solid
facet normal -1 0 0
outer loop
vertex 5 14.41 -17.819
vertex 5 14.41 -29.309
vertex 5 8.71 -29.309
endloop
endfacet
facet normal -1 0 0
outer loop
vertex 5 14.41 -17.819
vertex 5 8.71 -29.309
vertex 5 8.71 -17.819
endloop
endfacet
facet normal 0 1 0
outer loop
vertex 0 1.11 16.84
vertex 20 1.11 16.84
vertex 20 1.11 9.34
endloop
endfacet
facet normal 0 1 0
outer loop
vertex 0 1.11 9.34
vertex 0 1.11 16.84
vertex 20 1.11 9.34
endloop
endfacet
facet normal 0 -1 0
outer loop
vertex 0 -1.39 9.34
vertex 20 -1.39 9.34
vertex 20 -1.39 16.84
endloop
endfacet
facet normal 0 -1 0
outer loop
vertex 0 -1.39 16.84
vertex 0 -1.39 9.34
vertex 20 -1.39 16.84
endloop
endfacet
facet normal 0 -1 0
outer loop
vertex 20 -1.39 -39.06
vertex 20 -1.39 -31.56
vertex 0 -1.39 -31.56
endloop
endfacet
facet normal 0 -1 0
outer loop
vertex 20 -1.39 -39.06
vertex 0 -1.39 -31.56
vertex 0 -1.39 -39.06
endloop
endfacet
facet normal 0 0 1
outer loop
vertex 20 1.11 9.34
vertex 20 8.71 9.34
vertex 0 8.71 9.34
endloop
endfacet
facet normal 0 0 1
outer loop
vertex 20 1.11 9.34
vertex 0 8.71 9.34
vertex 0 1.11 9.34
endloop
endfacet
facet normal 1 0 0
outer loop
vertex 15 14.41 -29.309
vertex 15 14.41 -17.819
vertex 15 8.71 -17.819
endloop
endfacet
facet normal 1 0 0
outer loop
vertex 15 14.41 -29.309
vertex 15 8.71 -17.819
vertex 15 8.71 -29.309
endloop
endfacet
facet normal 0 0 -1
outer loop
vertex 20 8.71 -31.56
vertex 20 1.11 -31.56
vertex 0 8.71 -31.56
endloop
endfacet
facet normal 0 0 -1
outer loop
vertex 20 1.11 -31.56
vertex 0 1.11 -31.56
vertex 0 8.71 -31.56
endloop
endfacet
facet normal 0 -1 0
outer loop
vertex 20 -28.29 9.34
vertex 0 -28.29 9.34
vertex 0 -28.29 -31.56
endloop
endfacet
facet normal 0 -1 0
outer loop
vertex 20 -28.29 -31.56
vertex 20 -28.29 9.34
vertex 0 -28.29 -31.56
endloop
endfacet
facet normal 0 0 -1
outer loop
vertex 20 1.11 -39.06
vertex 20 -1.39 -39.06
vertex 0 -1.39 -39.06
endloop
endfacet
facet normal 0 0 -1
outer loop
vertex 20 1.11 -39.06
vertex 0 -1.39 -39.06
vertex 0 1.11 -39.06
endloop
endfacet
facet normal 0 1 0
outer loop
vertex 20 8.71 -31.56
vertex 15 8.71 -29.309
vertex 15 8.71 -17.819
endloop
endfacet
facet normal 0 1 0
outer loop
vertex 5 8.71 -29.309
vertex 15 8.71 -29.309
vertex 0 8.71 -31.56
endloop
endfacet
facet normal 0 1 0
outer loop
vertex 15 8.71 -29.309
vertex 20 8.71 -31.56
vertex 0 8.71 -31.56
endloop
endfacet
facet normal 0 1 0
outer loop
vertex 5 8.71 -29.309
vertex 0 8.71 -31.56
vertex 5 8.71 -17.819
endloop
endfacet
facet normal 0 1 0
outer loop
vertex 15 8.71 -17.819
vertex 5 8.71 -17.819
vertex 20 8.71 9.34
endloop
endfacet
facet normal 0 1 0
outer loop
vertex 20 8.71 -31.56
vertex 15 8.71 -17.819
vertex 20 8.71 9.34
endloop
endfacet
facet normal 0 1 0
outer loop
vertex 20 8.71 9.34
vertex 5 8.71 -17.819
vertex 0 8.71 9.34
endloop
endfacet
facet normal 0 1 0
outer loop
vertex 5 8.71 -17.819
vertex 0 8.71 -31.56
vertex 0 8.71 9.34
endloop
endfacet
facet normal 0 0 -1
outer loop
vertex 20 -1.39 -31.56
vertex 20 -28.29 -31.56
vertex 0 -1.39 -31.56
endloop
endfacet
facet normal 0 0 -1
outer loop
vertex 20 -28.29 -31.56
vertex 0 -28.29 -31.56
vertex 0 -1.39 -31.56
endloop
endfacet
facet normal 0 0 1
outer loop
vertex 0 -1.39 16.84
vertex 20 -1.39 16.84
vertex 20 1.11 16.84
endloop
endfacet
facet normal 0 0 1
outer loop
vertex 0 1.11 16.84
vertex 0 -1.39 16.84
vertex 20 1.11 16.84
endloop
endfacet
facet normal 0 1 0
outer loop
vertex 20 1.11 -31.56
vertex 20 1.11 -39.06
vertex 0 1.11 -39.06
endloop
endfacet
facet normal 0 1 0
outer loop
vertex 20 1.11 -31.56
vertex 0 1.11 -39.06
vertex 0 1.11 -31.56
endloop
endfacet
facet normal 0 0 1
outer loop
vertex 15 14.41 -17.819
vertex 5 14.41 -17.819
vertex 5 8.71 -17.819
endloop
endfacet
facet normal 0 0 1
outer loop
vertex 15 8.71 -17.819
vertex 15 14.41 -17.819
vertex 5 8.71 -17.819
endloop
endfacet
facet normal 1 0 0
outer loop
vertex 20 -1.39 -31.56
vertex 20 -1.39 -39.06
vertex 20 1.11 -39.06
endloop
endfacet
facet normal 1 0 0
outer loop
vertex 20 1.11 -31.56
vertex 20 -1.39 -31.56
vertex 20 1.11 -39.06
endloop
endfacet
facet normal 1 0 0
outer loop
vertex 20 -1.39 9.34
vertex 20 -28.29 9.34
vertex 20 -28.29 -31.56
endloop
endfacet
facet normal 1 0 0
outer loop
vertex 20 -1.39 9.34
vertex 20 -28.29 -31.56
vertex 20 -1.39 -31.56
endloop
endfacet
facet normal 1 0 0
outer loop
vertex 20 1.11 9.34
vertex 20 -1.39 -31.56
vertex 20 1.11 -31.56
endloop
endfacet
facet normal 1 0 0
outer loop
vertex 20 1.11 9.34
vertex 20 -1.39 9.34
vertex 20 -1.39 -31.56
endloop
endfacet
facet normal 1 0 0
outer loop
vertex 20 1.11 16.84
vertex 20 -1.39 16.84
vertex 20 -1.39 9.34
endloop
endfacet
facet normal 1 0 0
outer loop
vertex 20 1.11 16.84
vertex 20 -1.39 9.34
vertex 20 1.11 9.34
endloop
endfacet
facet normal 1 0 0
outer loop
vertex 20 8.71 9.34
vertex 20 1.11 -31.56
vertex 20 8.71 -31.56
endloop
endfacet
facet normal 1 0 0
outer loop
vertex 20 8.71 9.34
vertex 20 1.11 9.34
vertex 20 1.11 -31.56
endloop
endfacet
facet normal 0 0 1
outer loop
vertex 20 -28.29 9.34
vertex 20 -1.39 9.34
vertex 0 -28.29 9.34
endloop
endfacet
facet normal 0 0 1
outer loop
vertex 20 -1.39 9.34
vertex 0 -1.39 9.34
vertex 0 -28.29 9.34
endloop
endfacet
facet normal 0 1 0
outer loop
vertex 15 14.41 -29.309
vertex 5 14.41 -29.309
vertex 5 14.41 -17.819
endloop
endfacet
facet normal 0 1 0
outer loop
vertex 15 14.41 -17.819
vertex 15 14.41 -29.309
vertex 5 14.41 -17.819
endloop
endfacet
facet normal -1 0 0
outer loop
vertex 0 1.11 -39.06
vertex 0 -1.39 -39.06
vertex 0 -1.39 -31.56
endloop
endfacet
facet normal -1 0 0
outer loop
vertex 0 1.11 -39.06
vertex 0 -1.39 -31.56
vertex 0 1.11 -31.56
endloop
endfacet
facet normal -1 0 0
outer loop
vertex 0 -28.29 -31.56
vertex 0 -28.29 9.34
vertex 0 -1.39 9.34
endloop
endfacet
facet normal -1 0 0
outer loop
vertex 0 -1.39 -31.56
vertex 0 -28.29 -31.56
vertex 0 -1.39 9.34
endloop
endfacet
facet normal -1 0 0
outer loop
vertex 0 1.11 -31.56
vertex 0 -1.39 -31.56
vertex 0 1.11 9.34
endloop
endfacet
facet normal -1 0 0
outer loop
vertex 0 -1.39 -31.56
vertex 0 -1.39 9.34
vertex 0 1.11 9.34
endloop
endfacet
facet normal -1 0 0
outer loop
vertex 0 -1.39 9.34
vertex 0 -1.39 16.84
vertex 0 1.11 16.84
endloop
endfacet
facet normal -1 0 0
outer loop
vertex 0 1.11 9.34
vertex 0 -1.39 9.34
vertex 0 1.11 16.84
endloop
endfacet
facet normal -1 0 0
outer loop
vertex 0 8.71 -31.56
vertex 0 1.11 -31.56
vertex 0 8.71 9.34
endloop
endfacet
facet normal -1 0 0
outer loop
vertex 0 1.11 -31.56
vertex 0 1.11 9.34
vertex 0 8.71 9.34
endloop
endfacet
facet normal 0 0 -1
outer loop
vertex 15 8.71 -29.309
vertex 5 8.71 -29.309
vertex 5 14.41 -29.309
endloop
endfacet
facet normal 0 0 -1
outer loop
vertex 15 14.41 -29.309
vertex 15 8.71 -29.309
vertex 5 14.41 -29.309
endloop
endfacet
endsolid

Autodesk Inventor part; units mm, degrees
ref_plane "YZ Plane" through (0, 0, 0) normal (1, 0, 0) x (0, 1, 0)
ref_plane "XZ Plane" through (0, 0, 0) normal (0, 1, 0) x (-1, 0, 0)
ref_plane "XY Plane" through (0, 0, 0) normal (0, 0, 1) x (1, 0, 0)
sketch "Sketch1" plane through (0, 0, 0) normal (1, 0, 0) x (0, 1, 0)
  line L0 (8.7098, 9.3403) -> (-28.2902, 9.3403)
  line L1 (-28.2902, 9.3403) -> (-28.2902, -31.5597)
  line L2 (-28.2902, -31.5597) -> (8.7098, -31.5597)
  line L3 (8.7098, -31.5597) -> (8.7098, 9.3403)
  line L4 (8.7098, -29.3092) -> (14.4098, -29.3092)
  line L5 (14.4098, -29.3092) -> (14.4098, -17.8188)
  line L6 (14.4098, -17.8188) -> (8.7098, -17.8188)
  line L7 (8.7098, -17.8188) -> (8.7098, -29.3092)
  point P0 (0, 0)
  dimension "d0" = 37
  dimension "d1" = 40.9
  dimension "d2" = 5.7
extrude "Extrusion1" add sketch "Sketch1" along normal blind 20
sketch "Sketch2" plane through (20, 0, 0) normal (1, 0, 0) x (0, 0, -1)
  line L0 (29.3092, 14.4098) -> (17.8188, 14.4098) projected
  line L1 (29.3092, 8.7098) -> (29.3092, 14.4098) projected
  line L2 (17.8188, 14.4098) -> (29.3092, 14.4098)
  line L3 (29.3092, 14.4098) -> (29.3092, 8.7098)
  line L4 (29.3092, 8.7098) -> (17.8188, 8.7098)
  line L5 (17.8188, 8.7098) -> (17.8188, 14.4098)
  point P0 (0, 0)
extrude "Extrusion2" cut sketch "Sketch2" against normal blind 5
sketch "Sketch3" plane through (0, 0, 0) normal (-1, 0, 0) x (0, 0, 1)
  line L0 (-17.8188, 14.4098) -> (-29.3092, 14.4098) projected
  line L1 (-17.8188, 8.7098) -> (-17.8188, 14.4098) projected
  line L2 (-29.3092, 14.4098) -> (-17.8188, 14.4098)
  line L3 (-17.8188, 14.4098) -> (-17.8188, 8.7098)
  line L4 (-17.8188, 8.7098) -> (-29.3092, 8.7098)
  line L5 (-29.3092, 8.7098) -> (-29.3092, 14.4098)
  point P0 (0, 0)
extrude "Extrusion3" cut sketch "Sketch3" against normal blind 5
sketch "Sketch4" plane through (0, 0, 0) normal (-1, 0, 0) x (0, 0, 1)
  line L0 (9.3403, -28.2902) -> (-31.5597, -28.2902) projected
  line L1 (9.3403, -28.2902) -> (9.3403, -1.3902)
  line L2 (9.3403, 8.7098) -> (9.3403, -28.2902) projected
  line L3 (9.3403, -1.3902) -> (16.8403, -1.3902)
  line L4 (16.8403, -1.3902) -> (16.8403, 1.1098)
  line L5 (16.8403, 1.1098) -> (9.3403, 1.1098)
  line L6 (9.3403, 1.1098) -> (9.3403, -1.3902)
  line L7 (-31.5597, -28.2902) -> (-31.5597, 8.7098) projected
  line L8 (-31.5597, -1.3902) -> (-39.0597, -1.3902)
  line L9 (-39.0597, -1.3902) -> (-39.0597, 1.1098)
  line L10 (-39.0597, 1.1098) -> (-31.5597, 1.1098)
  line L11 (-31.5597, 1.1098) -> (-31.5597, -1.3902)
  point P0 (0, 0)
  dimension "d9" = 26.9
  dimension "d10" = 7.5
  dimension "d11" = 2.5
  dimension "d12" = 7.5
extrude "Extrusion4" add sketch "Sketch4" against normal blind 20
properties part number "servo"
